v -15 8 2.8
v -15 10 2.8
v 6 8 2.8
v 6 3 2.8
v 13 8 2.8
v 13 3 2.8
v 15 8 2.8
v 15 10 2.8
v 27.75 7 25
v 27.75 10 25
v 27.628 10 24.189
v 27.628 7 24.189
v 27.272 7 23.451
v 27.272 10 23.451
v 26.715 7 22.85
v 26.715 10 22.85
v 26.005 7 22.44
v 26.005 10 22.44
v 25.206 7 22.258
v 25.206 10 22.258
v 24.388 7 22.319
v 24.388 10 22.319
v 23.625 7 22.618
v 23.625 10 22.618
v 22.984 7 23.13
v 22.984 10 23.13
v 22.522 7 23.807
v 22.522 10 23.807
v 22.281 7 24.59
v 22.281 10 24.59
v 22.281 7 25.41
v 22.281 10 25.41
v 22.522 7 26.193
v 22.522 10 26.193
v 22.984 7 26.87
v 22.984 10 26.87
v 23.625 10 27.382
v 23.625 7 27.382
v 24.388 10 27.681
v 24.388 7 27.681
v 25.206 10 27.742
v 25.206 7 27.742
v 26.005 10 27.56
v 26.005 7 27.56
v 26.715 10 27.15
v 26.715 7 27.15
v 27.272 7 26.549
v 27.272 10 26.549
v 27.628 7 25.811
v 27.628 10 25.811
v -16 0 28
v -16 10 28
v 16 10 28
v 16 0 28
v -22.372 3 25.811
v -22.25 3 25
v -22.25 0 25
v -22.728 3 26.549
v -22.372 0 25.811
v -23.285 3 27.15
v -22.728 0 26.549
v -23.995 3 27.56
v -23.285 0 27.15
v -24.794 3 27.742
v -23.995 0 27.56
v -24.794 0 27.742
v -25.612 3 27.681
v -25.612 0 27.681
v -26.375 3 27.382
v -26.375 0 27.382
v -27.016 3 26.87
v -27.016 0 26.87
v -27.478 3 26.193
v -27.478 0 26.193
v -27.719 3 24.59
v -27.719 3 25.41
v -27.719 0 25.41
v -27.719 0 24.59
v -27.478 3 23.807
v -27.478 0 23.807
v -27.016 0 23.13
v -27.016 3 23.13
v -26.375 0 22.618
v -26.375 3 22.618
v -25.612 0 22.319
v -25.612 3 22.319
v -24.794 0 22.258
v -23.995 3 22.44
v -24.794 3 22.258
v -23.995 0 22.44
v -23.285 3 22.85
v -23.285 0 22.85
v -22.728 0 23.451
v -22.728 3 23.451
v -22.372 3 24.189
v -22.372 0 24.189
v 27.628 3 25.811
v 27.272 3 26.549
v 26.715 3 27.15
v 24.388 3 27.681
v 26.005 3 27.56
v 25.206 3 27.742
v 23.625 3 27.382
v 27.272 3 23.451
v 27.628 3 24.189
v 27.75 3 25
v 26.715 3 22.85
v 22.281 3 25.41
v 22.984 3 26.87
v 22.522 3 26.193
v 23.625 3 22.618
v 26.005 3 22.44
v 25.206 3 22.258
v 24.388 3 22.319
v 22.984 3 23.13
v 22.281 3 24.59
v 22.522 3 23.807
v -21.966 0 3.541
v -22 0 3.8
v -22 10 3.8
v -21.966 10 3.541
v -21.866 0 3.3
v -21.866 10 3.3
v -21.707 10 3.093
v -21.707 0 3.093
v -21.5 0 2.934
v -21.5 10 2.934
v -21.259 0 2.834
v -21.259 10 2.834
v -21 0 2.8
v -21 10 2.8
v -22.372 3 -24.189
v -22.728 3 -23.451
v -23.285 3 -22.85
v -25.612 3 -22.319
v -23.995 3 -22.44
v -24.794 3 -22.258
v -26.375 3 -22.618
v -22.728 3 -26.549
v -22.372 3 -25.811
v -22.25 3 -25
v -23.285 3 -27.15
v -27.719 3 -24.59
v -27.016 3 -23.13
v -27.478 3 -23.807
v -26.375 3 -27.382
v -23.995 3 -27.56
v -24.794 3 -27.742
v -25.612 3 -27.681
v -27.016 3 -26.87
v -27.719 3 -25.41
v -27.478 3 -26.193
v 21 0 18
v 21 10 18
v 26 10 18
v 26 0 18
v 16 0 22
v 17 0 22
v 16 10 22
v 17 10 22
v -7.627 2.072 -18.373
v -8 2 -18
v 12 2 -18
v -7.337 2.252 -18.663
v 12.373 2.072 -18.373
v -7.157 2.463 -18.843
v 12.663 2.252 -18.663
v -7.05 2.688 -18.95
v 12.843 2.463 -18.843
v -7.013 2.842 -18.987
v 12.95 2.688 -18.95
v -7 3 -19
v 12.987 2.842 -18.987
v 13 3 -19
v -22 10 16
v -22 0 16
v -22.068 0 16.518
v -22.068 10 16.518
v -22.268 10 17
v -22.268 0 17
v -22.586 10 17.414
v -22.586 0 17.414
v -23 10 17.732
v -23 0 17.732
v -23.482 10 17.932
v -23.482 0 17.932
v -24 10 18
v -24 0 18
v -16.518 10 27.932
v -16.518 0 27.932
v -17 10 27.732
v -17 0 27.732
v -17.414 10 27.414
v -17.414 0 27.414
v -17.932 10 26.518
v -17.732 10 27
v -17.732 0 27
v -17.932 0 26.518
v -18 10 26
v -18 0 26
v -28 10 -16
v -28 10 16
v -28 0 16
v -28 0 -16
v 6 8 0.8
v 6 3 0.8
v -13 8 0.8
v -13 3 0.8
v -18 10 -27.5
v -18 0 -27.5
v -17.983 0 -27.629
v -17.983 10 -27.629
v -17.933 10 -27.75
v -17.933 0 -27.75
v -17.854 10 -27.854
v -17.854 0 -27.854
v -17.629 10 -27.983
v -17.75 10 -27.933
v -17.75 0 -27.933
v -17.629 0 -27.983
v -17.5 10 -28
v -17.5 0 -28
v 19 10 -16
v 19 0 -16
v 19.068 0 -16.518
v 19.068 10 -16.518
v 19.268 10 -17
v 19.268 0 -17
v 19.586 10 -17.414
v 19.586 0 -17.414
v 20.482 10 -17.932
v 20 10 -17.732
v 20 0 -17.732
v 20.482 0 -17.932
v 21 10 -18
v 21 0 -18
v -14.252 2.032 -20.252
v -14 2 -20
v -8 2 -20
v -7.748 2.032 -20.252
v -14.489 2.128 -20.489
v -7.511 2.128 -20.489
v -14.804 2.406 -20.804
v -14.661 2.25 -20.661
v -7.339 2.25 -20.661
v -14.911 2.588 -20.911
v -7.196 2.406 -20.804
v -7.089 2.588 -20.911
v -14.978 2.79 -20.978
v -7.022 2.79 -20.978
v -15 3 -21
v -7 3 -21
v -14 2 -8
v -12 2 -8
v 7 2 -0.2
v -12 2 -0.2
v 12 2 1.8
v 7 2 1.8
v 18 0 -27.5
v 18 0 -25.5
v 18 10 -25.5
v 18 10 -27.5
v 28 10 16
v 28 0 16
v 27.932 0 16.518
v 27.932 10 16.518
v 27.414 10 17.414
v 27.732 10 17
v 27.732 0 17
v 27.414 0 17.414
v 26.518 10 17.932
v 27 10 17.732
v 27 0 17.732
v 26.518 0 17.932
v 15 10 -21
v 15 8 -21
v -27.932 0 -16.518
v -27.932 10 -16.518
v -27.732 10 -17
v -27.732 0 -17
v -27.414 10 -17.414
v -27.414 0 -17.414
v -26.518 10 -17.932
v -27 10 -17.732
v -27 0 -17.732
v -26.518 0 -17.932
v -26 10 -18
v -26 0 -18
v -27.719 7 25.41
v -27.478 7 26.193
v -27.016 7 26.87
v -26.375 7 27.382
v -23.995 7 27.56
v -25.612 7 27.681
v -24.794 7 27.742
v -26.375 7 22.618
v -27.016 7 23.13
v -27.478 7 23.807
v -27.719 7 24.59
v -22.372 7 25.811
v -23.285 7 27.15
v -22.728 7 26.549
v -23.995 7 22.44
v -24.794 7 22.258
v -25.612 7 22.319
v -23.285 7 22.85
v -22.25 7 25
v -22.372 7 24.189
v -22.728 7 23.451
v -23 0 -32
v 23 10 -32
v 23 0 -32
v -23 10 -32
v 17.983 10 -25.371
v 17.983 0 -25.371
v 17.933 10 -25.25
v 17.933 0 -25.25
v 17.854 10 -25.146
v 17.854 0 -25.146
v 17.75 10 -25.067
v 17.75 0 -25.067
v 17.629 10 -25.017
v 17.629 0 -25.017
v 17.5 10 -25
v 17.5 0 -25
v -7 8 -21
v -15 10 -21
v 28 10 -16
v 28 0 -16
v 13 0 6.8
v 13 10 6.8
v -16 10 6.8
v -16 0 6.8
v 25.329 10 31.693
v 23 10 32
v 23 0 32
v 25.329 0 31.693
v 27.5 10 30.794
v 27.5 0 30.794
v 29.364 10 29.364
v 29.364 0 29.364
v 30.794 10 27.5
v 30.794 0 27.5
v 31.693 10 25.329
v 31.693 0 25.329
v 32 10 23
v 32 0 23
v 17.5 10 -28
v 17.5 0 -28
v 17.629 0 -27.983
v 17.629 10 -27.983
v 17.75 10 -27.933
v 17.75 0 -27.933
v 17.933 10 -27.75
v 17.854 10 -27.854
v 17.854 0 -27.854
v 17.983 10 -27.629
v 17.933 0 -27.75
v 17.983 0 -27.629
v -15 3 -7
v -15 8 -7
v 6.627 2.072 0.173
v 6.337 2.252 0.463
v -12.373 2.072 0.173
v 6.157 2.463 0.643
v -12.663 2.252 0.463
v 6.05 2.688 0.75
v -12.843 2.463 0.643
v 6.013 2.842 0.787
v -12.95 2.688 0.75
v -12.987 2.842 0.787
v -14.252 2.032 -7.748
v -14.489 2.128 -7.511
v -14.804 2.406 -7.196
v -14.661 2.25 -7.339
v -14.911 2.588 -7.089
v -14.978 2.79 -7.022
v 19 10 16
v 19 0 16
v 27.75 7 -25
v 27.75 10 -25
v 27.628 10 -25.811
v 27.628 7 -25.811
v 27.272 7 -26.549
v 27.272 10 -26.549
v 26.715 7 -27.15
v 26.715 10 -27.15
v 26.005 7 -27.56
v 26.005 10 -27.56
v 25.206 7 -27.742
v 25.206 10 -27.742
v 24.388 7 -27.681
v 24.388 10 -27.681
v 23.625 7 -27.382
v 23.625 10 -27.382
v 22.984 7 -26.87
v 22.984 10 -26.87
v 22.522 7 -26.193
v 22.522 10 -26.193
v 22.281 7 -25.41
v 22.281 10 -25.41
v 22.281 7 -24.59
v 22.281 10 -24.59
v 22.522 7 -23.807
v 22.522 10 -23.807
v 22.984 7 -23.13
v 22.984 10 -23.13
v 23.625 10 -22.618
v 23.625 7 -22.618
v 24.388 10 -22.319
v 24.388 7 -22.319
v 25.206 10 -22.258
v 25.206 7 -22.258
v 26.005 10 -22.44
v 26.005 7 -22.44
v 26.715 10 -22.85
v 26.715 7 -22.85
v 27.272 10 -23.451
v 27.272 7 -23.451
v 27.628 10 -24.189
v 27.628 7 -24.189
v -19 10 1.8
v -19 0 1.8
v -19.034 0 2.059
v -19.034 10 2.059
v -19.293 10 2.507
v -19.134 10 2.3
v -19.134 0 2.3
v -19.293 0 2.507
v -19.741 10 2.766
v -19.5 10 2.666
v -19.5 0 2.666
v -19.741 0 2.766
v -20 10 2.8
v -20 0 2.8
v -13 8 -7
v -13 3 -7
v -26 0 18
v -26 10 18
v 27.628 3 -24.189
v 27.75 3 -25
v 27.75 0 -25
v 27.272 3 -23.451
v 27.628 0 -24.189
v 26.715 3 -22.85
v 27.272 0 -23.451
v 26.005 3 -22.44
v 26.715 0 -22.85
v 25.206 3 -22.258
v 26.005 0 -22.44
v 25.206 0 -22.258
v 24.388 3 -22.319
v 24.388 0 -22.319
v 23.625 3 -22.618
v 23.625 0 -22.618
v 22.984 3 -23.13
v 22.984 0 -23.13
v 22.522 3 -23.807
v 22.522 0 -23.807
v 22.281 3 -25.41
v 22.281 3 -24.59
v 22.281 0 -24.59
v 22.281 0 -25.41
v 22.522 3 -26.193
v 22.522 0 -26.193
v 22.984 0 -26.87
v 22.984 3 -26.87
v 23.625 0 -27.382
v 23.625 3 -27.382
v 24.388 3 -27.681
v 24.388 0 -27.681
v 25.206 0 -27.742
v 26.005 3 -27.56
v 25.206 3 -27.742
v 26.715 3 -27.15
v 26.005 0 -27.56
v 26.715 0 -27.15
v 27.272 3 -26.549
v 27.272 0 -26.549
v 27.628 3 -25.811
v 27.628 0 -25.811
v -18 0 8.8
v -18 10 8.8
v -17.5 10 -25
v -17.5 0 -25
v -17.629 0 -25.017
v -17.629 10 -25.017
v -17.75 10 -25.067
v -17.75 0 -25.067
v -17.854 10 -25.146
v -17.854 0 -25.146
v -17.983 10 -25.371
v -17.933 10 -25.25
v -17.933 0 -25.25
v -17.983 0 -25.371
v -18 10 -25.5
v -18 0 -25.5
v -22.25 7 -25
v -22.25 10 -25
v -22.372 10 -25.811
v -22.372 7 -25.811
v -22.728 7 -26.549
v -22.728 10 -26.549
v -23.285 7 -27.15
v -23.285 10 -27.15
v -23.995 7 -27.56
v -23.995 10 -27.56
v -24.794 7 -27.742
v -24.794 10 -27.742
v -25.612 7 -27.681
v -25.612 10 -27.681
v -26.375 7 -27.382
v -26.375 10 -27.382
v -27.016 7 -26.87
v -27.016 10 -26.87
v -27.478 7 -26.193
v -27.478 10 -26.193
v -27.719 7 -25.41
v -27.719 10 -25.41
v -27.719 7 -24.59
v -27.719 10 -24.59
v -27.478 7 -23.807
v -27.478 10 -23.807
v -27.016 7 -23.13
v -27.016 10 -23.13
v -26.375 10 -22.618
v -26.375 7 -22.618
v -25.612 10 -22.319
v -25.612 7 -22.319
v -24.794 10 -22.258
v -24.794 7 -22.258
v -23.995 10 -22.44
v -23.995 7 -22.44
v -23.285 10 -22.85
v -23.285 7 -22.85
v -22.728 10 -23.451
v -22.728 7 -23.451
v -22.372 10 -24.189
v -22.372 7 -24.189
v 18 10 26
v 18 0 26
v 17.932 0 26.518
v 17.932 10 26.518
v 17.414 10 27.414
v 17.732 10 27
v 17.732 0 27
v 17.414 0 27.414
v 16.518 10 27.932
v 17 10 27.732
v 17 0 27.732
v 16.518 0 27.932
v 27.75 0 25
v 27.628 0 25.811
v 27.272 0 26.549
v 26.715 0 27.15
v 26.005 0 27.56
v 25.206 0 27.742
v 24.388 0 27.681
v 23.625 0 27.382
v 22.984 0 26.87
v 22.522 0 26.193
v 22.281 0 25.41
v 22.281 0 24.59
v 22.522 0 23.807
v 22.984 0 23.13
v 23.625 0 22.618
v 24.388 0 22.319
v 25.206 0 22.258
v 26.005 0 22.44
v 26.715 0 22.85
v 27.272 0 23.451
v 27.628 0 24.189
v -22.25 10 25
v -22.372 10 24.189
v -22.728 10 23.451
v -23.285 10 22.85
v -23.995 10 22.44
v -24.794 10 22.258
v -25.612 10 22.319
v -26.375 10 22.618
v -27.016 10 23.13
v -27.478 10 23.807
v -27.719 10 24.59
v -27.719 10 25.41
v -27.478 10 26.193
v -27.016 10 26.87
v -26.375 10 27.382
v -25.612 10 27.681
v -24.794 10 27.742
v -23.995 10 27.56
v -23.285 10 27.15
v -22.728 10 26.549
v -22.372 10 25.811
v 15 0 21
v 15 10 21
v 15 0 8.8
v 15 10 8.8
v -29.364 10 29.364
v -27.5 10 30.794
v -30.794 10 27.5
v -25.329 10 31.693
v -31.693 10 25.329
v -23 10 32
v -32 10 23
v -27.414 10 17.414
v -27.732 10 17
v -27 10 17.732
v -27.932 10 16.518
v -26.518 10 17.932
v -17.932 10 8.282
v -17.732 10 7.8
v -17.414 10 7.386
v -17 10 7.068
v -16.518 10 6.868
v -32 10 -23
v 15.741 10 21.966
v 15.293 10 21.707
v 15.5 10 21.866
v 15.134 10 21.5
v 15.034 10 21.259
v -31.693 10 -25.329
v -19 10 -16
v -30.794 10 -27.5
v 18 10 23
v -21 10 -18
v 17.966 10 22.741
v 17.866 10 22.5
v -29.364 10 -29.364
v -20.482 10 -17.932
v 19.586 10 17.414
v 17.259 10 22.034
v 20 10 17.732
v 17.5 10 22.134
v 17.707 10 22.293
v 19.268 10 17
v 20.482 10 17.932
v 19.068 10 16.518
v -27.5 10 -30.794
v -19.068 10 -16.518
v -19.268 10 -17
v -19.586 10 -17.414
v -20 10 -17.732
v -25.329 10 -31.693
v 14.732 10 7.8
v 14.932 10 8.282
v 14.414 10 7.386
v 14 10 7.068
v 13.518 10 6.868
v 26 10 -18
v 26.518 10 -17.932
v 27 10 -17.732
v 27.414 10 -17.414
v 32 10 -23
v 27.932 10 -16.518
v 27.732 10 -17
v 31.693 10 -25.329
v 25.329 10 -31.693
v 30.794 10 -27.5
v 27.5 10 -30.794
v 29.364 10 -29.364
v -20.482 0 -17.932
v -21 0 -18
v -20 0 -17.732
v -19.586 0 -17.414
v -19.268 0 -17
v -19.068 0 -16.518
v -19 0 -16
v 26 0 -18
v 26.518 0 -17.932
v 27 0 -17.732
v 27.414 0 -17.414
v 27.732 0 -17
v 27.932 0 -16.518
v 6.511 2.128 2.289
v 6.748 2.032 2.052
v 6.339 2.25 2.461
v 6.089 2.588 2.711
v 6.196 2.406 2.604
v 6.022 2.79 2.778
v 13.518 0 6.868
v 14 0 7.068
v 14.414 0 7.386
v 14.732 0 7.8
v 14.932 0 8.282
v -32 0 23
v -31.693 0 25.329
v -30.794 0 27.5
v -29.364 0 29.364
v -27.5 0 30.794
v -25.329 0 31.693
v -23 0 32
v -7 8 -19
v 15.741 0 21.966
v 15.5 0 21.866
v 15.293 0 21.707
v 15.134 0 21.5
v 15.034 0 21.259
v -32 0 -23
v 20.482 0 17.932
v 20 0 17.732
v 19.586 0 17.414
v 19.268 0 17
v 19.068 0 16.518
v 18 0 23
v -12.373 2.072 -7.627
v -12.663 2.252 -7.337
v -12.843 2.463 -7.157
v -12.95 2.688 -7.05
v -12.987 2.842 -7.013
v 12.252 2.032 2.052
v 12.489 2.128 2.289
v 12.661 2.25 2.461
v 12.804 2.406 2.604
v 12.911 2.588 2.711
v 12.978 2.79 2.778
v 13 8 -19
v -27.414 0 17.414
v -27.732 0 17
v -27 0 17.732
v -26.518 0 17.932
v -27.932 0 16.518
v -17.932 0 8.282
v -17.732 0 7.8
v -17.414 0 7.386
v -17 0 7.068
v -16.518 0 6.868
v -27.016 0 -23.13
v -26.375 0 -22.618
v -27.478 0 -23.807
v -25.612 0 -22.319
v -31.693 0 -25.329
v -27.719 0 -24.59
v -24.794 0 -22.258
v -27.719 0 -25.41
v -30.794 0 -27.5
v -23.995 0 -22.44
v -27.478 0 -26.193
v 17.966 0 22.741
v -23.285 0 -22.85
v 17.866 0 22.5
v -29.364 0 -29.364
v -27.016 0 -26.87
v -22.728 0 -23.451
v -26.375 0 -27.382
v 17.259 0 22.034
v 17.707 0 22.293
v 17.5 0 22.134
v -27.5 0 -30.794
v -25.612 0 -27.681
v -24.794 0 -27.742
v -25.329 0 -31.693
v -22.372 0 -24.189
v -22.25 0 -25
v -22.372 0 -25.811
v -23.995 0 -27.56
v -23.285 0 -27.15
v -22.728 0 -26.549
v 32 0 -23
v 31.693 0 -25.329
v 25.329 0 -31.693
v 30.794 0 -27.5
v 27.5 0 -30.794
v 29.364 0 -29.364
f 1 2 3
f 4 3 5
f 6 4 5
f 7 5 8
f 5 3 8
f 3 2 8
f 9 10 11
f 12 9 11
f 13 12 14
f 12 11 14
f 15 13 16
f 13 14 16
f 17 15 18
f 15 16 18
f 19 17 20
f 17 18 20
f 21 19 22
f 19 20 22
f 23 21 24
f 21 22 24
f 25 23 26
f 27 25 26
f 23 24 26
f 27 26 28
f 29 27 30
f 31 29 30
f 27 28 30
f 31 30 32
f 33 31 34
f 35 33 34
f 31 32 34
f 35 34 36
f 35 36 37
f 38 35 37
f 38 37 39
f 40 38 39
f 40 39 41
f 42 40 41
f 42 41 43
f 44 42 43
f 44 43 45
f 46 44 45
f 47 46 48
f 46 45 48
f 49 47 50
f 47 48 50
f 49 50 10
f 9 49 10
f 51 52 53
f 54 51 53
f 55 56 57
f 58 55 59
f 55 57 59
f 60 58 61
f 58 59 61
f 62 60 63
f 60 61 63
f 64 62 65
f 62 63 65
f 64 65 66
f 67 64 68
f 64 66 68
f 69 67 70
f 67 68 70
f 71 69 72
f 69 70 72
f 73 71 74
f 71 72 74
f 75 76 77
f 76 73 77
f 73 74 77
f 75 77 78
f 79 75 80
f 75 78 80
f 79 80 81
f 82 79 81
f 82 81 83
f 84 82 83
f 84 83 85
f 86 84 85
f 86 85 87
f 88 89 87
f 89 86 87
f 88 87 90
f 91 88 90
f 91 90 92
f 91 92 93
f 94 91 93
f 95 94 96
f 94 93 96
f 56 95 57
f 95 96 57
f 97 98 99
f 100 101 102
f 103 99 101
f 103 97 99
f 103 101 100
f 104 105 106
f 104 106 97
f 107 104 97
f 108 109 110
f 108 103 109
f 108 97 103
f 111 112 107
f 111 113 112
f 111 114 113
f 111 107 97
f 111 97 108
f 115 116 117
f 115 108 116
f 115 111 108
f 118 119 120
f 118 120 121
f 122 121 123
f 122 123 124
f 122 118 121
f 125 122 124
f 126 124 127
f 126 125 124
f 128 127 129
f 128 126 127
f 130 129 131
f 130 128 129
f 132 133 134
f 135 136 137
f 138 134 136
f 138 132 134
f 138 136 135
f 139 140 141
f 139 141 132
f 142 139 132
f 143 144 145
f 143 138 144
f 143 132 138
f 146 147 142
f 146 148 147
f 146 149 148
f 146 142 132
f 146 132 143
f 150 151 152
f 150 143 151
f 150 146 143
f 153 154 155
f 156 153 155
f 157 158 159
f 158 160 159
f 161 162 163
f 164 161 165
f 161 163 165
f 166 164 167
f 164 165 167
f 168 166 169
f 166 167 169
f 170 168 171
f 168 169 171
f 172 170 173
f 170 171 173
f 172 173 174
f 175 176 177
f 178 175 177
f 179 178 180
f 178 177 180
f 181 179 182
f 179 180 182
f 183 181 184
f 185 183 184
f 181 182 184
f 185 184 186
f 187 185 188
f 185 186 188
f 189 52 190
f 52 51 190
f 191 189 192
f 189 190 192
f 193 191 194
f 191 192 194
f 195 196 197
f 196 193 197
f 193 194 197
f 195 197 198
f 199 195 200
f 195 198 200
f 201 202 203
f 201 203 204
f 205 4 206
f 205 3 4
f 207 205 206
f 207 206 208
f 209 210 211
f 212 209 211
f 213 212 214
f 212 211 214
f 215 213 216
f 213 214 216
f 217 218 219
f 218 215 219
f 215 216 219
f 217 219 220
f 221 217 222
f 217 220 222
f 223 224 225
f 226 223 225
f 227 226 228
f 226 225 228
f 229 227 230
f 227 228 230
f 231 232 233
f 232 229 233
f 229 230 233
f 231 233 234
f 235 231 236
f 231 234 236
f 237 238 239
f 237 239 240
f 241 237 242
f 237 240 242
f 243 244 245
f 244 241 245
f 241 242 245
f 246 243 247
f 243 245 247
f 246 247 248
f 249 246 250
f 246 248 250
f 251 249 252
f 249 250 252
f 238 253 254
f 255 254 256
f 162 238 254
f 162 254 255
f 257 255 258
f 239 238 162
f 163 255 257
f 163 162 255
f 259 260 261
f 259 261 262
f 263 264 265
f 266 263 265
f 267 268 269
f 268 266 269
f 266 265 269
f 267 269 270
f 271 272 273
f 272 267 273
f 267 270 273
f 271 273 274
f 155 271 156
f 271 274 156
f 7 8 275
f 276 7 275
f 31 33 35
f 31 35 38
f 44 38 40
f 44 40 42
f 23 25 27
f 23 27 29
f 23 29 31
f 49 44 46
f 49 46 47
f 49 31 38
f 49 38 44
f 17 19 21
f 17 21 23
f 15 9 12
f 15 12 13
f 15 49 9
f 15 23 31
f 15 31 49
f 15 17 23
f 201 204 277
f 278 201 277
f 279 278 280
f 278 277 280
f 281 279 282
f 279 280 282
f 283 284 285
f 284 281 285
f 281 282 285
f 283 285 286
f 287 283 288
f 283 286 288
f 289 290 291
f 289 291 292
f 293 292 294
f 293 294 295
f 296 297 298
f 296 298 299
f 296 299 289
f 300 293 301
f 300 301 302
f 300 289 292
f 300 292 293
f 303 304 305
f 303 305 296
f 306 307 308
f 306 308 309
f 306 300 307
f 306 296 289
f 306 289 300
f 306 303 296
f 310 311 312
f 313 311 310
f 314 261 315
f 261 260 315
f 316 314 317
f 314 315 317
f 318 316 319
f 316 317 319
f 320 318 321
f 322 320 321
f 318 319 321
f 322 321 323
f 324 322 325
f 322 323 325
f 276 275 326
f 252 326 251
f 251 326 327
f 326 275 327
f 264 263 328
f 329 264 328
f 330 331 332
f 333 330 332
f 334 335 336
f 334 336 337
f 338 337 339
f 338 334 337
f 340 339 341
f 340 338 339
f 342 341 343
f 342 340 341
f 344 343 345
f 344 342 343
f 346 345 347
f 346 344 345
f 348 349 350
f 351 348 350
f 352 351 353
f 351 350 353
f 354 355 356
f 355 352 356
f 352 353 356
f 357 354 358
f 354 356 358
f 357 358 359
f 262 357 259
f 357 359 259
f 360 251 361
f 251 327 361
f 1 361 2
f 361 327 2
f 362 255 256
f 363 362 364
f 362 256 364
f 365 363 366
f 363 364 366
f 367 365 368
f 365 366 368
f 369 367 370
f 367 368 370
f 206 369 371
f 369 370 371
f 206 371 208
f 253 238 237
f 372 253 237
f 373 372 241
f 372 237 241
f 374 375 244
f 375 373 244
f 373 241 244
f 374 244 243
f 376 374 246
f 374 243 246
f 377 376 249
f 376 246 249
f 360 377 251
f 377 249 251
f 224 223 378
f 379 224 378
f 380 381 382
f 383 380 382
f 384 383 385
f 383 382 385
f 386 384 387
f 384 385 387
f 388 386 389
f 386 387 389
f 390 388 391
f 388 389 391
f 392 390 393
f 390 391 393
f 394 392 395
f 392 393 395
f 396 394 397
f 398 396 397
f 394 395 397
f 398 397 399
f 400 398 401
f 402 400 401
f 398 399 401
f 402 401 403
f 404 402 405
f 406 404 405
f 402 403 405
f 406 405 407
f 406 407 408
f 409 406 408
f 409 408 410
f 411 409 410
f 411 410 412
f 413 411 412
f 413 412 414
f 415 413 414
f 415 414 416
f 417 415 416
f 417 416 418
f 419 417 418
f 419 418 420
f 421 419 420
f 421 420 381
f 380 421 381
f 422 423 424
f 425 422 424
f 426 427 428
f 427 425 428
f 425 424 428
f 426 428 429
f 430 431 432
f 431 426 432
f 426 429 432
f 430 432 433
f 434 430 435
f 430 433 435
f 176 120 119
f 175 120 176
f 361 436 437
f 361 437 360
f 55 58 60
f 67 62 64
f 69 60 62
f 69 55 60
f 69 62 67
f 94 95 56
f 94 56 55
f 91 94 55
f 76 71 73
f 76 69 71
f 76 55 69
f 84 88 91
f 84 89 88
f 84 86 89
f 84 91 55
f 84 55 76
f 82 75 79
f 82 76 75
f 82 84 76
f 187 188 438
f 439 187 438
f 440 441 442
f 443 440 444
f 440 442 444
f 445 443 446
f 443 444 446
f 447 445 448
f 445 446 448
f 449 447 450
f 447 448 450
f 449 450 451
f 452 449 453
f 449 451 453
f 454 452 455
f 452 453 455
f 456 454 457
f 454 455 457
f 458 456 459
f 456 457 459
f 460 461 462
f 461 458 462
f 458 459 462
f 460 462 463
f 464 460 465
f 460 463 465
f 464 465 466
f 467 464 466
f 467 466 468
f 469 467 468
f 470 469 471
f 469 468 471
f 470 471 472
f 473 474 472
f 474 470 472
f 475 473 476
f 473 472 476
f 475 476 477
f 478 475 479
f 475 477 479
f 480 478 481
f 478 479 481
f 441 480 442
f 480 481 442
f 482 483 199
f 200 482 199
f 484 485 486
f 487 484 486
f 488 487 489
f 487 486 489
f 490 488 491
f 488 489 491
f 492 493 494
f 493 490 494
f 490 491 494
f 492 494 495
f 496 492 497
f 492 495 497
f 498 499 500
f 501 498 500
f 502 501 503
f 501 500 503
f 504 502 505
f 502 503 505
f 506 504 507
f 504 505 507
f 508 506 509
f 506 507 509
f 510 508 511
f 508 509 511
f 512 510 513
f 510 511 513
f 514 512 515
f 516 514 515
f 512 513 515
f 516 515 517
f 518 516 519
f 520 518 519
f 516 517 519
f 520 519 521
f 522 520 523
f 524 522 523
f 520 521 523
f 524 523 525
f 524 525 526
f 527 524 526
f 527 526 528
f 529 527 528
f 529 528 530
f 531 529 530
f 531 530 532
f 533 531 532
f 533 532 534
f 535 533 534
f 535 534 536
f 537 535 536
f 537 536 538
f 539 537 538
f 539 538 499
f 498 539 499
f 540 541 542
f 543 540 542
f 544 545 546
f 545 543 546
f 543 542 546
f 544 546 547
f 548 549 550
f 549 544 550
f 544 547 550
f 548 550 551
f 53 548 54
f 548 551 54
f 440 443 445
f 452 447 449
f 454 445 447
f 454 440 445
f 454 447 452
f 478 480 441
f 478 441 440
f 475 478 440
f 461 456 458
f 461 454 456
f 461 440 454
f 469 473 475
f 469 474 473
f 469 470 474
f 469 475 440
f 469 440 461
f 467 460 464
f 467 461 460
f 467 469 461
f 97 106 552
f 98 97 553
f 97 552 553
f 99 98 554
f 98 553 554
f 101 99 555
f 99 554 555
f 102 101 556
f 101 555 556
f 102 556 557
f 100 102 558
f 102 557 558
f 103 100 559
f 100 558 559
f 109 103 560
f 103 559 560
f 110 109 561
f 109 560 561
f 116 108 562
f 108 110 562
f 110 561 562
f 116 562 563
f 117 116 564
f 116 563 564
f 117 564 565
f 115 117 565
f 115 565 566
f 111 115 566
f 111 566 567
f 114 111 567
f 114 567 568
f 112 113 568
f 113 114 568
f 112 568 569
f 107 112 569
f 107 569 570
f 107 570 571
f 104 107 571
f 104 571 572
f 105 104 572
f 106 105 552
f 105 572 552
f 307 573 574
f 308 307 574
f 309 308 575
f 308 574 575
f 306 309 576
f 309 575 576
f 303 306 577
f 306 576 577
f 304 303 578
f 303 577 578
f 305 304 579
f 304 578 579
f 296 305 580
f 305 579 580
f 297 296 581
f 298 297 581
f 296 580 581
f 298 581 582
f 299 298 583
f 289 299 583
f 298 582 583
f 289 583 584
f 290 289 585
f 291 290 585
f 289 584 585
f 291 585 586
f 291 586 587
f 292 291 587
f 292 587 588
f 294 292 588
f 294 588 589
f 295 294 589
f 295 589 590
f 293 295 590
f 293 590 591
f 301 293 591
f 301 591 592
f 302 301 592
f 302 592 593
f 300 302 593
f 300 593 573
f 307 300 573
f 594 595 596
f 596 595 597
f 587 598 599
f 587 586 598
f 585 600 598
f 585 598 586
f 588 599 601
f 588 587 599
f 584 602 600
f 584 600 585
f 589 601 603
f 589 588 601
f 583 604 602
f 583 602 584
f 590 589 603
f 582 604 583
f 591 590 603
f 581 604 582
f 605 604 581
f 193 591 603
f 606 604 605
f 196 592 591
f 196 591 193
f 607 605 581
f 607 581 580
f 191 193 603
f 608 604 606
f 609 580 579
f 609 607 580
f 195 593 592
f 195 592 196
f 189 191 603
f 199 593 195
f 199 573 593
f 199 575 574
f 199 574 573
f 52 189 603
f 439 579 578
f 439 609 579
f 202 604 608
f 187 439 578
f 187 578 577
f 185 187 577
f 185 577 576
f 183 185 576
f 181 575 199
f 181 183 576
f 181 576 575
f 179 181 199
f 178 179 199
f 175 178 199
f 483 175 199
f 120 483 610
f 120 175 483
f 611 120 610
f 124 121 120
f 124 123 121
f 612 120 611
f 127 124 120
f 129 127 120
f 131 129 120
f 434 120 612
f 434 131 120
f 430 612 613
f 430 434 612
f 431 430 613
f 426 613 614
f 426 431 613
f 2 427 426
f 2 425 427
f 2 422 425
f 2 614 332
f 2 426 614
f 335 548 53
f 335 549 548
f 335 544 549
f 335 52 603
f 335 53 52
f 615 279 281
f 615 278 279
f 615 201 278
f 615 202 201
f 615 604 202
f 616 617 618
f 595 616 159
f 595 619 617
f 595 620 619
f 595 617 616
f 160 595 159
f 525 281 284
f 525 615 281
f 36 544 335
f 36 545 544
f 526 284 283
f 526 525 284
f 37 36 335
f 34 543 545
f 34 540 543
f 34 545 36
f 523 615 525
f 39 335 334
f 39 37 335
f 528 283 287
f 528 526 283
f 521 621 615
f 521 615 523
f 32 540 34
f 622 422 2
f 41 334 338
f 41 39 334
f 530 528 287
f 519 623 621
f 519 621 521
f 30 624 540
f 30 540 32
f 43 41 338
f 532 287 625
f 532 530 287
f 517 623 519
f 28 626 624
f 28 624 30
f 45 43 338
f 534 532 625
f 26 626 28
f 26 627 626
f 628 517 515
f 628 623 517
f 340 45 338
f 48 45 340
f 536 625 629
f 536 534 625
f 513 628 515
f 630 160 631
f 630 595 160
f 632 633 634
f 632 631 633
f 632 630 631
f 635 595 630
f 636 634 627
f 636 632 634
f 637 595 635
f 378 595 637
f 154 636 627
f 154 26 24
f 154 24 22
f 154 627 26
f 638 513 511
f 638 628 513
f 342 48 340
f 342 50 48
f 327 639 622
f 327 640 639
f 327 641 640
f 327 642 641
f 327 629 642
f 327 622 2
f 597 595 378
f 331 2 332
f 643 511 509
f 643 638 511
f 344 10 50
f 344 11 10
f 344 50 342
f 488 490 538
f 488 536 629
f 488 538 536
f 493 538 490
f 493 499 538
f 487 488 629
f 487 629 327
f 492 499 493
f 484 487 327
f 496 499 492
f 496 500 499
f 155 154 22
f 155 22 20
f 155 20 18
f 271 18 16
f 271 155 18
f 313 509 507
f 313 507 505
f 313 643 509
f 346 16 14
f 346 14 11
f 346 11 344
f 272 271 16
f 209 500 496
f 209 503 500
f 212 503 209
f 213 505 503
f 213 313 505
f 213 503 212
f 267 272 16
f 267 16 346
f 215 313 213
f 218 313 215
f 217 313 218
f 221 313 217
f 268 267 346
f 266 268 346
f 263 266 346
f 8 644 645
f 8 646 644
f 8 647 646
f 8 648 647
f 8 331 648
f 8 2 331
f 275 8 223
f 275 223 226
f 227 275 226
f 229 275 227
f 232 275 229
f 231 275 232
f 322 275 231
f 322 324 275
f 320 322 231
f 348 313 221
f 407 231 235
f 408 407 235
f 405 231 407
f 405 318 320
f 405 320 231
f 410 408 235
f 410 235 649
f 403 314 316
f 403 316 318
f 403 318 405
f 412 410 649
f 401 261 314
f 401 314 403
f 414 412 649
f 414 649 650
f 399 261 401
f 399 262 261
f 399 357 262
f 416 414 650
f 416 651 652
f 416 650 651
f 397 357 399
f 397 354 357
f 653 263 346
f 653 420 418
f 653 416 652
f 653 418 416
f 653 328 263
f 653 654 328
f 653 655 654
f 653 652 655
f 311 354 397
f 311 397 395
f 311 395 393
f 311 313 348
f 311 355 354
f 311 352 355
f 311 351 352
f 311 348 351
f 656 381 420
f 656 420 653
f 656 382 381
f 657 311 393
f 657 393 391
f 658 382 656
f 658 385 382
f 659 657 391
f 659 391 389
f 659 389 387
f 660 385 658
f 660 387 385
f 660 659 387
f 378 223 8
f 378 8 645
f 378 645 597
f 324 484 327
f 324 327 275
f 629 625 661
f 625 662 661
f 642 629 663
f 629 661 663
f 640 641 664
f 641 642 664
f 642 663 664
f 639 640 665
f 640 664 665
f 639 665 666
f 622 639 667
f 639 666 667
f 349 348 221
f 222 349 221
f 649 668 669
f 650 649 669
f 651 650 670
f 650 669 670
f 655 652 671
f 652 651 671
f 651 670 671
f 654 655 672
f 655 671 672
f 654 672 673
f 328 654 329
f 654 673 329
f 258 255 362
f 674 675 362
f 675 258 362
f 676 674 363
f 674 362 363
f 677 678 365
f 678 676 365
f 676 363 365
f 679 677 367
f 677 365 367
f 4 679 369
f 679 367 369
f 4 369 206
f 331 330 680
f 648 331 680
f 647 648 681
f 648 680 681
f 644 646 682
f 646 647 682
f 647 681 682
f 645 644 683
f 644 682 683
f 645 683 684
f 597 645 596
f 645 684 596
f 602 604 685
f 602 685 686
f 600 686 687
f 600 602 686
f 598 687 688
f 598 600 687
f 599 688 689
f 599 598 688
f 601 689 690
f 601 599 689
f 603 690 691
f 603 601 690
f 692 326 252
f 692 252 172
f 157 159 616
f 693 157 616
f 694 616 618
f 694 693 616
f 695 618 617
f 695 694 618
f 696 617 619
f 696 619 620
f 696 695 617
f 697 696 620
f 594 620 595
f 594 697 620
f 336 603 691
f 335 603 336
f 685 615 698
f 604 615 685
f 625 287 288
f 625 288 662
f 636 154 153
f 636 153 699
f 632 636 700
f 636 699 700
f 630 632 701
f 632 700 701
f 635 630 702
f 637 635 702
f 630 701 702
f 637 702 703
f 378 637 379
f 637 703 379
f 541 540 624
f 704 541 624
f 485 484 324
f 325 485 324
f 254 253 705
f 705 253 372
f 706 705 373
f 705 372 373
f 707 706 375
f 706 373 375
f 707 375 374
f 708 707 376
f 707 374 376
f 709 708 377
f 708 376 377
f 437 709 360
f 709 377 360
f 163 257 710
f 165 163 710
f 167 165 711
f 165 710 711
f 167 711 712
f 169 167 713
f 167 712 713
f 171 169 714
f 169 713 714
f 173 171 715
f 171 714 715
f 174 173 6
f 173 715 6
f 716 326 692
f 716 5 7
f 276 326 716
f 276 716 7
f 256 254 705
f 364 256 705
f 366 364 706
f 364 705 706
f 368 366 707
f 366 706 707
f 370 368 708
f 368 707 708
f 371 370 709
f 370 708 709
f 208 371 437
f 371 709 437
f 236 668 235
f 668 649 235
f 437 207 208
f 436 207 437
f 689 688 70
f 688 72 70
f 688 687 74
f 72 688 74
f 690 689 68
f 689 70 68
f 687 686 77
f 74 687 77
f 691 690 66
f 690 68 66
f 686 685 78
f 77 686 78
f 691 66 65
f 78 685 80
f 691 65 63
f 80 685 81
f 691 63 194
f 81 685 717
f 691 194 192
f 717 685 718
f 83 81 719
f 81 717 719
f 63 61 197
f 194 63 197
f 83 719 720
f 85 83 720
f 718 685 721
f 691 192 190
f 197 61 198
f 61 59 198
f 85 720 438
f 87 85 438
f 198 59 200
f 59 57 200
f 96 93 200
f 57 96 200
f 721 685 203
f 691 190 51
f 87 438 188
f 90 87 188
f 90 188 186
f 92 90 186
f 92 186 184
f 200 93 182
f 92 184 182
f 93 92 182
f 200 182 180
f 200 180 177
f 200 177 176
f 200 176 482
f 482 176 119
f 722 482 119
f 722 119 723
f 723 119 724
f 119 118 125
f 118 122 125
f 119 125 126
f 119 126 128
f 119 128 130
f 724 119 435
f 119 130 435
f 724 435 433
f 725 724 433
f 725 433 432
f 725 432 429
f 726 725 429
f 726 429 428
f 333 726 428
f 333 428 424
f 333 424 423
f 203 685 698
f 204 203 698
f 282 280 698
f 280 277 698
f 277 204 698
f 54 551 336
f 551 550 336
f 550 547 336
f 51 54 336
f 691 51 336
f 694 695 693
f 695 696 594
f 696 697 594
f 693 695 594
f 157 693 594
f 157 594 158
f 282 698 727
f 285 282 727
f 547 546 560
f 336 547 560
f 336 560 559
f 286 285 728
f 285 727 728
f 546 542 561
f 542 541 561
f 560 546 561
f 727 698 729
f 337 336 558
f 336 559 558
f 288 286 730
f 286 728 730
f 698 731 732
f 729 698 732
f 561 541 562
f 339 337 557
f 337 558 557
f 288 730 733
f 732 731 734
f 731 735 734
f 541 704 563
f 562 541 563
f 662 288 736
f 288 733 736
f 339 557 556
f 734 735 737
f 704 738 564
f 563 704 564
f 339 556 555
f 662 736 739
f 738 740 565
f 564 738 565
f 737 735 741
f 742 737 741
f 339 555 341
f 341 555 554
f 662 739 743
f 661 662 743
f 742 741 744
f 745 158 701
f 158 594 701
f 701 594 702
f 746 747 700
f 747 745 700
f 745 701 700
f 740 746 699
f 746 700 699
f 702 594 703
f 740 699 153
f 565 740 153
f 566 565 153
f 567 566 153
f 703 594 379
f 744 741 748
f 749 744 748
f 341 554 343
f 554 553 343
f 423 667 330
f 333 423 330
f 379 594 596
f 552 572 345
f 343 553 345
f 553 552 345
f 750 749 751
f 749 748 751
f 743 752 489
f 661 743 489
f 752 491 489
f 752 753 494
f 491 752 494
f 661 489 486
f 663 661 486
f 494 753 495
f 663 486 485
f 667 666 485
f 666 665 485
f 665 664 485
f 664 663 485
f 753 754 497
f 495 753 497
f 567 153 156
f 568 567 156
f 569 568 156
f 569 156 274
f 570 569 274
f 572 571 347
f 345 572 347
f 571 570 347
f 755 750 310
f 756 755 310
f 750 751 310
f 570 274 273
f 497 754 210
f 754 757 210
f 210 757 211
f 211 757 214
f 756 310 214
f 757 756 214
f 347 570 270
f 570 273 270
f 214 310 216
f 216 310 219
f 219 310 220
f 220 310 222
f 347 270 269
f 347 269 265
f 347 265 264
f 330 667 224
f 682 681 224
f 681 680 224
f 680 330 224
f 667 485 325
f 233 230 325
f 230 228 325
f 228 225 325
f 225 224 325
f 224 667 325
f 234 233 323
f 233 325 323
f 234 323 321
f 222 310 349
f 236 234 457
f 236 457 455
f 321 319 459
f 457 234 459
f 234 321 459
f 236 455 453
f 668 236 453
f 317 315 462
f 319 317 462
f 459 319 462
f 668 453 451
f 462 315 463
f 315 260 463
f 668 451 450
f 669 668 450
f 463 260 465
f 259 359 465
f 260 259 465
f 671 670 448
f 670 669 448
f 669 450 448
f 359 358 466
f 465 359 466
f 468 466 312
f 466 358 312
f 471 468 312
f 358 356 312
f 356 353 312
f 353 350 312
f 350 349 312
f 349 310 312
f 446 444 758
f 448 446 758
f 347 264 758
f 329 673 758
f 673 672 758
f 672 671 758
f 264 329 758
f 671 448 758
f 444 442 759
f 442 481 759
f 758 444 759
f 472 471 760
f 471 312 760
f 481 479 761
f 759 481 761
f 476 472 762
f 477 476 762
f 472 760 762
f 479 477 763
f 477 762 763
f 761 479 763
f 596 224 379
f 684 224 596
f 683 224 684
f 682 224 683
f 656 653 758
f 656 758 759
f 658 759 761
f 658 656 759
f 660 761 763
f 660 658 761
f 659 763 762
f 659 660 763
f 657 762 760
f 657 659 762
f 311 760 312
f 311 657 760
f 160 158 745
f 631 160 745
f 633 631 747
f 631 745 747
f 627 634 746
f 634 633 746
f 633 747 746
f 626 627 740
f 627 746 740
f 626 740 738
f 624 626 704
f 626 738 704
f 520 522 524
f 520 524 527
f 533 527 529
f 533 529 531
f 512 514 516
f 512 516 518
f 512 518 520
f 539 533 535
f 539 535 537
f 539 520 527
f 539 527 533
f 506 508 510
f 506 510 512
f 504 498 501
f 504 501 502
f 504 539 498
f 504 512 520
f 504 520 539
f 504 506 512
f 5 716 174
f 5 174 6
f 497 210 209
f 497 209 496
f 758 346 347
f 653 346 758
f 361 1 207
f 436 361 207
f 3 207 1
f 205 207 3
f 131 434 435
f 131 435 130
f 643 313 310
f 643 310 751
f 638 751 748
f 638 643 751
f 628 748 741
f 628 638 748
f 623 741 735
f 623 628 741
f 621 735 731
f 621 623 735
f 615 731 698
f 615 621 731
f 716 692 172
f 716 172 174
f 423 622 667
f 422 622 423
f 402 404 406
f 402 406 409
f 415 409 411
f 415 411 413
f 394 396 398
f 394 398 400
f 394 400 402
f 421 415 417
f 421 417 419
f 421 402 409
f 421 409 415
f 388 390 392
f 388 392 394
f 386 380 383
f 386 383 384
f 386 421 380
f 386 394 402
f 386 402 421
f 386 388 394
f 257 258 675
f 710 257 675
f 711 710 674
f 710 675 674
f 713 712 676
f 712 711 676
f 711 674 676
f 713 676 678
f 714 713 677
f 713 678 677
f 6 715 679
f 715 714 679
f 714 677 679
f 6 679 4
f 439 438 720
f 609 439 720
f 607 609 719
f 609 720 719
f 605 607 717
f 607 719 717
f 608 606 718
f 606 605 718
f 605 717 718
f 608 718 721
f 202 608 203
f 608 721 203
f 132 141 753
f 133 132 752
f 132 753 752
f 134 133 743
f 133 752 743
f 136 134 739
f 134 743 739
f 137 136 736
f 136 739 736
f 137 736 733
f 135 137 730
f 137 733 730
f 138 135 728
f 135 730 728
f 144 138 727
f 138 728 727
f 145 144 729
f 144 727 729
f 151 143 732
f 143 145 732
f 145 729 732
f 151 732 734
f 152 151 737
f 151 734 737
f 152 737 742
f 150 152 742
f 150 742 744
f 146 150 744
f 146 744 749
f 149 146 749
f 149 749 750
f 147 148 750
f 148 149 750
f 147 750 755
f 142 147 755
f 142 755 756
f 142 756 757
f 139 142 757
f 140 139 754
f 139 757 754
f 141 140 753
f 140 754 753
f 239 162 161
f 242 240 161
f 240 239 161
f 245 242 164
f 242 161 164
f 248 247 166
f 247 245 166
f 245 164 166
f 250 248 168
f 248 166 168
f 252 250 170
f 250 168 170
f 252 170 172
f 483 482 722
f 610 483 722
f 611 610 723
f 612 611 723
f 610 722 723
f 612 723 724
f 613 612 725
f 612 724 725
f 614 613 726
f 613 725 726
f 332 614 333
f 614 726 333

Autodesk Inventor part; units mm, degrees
ref_plane "YZ Plane" through (0, 0, 0) normal (1, 0, 0) x (0, 1, 0)
ref_plane "XZ Plane" through (0, 0, 0) normal (0, 1, 0) x (-1, 0, 0)
sketch "Sketch1" plane through (0, 0, 0) normal (0, 1, 0) x (-1, 0, 0)
  line L0 (30, 30) -> (-30, 30)
  line L1 (-30, 30) -> (-30, -30)
  line L2 (-30, -30) -> (30, -30)
  line L3 (30, -30) -> (30, 30)
  line L4 (30, 30) -> (-30, -30) construction
  line L5 (-30, 30) -> (30, -30) construction
  point P0 (0, 0)
  dimension "d0" = 60
  dimension "d1" = 60
extrude "Extrusion1" add sketch "Sketch1" along normal blind 10
fillet "Fillet1" radius 7 4 edges at (30, 5, 30) (30, 5, -30) (-30, 5, 30) (-30, 5, -30)
sketch "Sketch2" plane through (0, 10, 0) normal (0, 1, 0) x (1, 0, 0)
  line L0 (-30, 30) -> (30, 30)
  line L1 (30, 30) -> (30, -30)
  line L2 (30, -30) -> (-30, -30)
  line L3 (-30, -30) -> (-30, 30)
  line L4 (-30, 30) -> (30, -30) construction
  line L5 (30, 30) -> (-30, -30) construction
  line L6 (25, -25) -> (25, 25)
  line L7 (25, 25) -> (-25, 25)
  line L8 (-25, 25) -> (-25, -25)
  line L9 (-25, -25) -> (25, -25)
  circle A0 centre (25, -25) radius 2.75
  circle A1 centre (-25, -25) radius 2.75
  circle A2 centre (25, 25) radius 2.75
  circle A3 centre (-25, 25) radius 2.75
  point P0 (0, 0)
  dimension "d5" = 5
  dimension "d6" = 5.5
  dimension "d7" = 5.5
  dimension "d8" = 5.5
  dimension "d9" = 5.5
extrude "Extrusion2" cut sketch "Sketch2" against normal blind 3 contours L9 A0 L6 | L6 A0 L9 | A2 L7 L6 | L6 L7 A2 | A1 L8 L9 | L9 L8 A1 | A3 L8 L7 | L7 L8 A3
sketch "Sketch7" plane through (0, 10, 0) normal (0, 1, 0) x (1, 0, 0)
  line L0 (-23, 30) -> (23, 30)
  line L1 (30, 23) -> (30, -23)
  line L2 (23, -30) -> (-23, -30)
  line L3 (-30, -23) -> (-30, 23)
  line L4 (-30, 30) -> (30, -30) construction
  line L5 (30, 30) -> (-30, -30) construction
  arc A0 (-23, 30) -> (-30, 23) centre (-23, 23) ccw
  arc A1 (-30, -23) -> (-23, -30) centre (-23, -23) ccw
  arc A2 (23, -30) -> (30, -23) centre (23, -23) ccw
  arc A3 (30, 23) -> (23, 30) centre (23, 23) ccw
  line L6 (23, 32) -> (-23, 32)
  arc A4 (-23, 32) -> (-32, 23) centre (-23, 23) ccw
  line L7 (-32, 23) -> (-32, -23)
  arc A5 (-32, -23) -> (-23, -32) centre (-23, -23) ccw
  line L8 (-23, -32) -> (23, -32)
  arc A6 (23, -32) -> (32, -23) centre (23, -23) ccw
  line L9 (32, -23) -> (32, 23)
  arc A7 (32, 23) -> (23, 32) centre (23, 23) ccw
  point P0 (0, 0)
  dimension "d47" = 7
  dimension "d48" = 2
extrude "Extrusion6" add sketch "Sketch7" against normal blind 10
sketch "Sketch33" plane through (0, 10, 0) normal (0, 1, 0) x (1, 0, 0)
  line L0 (-25, 25) -> (25, 25)
  line L1 (25, 25) -> (25, -25)
  line L2 (25, -25) -> (-25, -25)
  line L3 (-25, -25) -> (-25, 25)
  line L4 (-25, 25) -> (25, -25) construction
  line L5 (25, 25) -> (-25, -25) construction
  line L6 (21, 21) -> (-21, 21)
  line L7 (-21, 21) -> (-21, -21)
  line L8 (-21, -21) -> (21, -21)
  line L9 (21, -21) -> (21, 21)
  line L10 (-15, 21) -> (-15, -2.8)
  line L11 (-15, -2.8) -> (15, -2.8)
  line L12 (15, -2.8) -> (15, 21)
  line L13 (-13, 7) -> (-13, -0.8)
  line L14 (-13, -0.8) -> (6, -0.8)
  line L15 (13, -0.8) -> (13, 19)
  line L16 (-7, 21) -> (-7, 19)
  line L17 (-7, 19) -> (13, 19)
  line L18 (13, -0.8) -> (13, -2.8)
  line L19 (6, -2.8) -> (6, -0.8)
  line L20 (-15, 7) -> (-13, 7)
  point P0 (0, 0)
  point P1 (-21, 15)
  dimension "d349" = 50
  dimension "d350" = 50
  dimension "d351" = 4
  dimension "d352" = 6
  dimension "d353" = 30
  dimension "d354" = 6
  dimension "d355" = 23.8
  dimension "d356" = 8
  dimension "d357" = 2
  dimension "d358" = 7
  dimension "d359" = 2
  dimension "d360" = 2
  dimension "d361" = 14
extrude "Extrusion31" cut sketch "Sketch33" against normal blind 2 contours L12 L11 L18 L15 L17 L16 L6 | L20 L13 L14 L19 L11 L10
sketch "Sketch34" plane through (0, 10, 0) normal (0, 1, 0) x (1, 0, 0)
  line L0 (13, -2.8) -> (6, -2.8)
  line L1 (6, -2.8) -> (6, -0.8)
  line L2 (6, -0.8) -> (-13, -0.8)
  line L3 (-13, -0.8) -> (-13, 7)
  line L4 (-13, 7) -> (-15, 7)
  line L5 (-15, 7) -> (-15, 21)
  line L6 (-15, 21) -> (-7, 21)
  line L7 (-7, 21) -> (-7, 19)
  line L8 (-7, 19) -> (13, 19)
  line L9 (13, 19) -> (13, -2.8)
  line L10 (13, -2.8) -> (13, 19) projected
  point P0 (0, 0)
extrude "Extrusion32" cut sketch "Sketch34" against normal blind 8
sketch "Sketch35" plane through (0, 10, 0) normal (0, 1, 0) x (1, 0, 0)
  line L0 (23, 32) -> (-23, 32) projected
  line L1 (-32, 23) -> (-32, -23) projected
  line L2 (32, -23) -> (32, 23) projected
  line L3 (-15, 21) -> (15, 21) projected
  line L4 (18, 28) -> (-18, 28)
  line L5 (-18, 28) -> (-18, 25)
  line L6 (-18, 25) -> (18, 25)
  line L7 (18, 25) -> (18, 28)
  line L8 (-23, -32) -> (23, -32) projected
  line L9 (15, 21) -> (15, -2.8) projected
  line L10 (28, -18) -> (28, 18)
  line L11 (28, 18) -> (19, 18)
  line L12 (19, 18) -> (19, -18)
  line L13 (19, -18) -> (28, -18)
  line L14 (15, -2.8) -> (-15, -2.8) projected
  line L15 (-18, -28) -> (18, -28)
  line L16 (18, -28) -> (18, -22)
  line L17 (18, -22) -> (15, -22)
  line L18 (15, -22) -> (15, -6.8)
  line L19 (15, -6.8) -> (-18, -6.8)
  line L20 (-18, -6.8) -> (-18, -28)
  line L21 (-15, -2.8) -> (-15, 21) projected
  line L22 (-22, -18) -> (-28, -18)
  line L23 (-28, -18) -> (-28, 18)
  line L24 (-28, 18) -> (-19, 18)
  line L25 (-19, 18) -> (-19, -2.8)
  line L26 (-19, -2.8) -> (-22, -2.8)
  line L27 (-22, -2.8) -> (-22, -18)
  point P0 (0, 0)
  dimension "d366" = 4
  dimension "d367" = 4
  dimension "d368" = 14
  dimension "d369" = 14
  dimension "d370" = 4
  dimension "d371" = 4
  dimension "d372" = 14
  dimension "d373" = 4
  dimension "d374" = 14
  dimension "d375" = 4
  dimension "d376" = 4
  dimension "d377" = 14
  dimension "d378" = 4
  dimension "d379" = 4
  dimension "d380" = 4
  dimension "d381" = 14
  dimension "d382" = 4
  dimension "d383" = 14
  dimension "d384" = 14
  dimension "d385" = 4
  dimension "d386" = 4
  dimension "d387" = 4
extrude "Extrusion33" cut sketch "Sketch35" against normal through all contours L7 L6 L5 L4 | L13 L12 L11 L10 | L20 L19 L18 L17 L16 L15 | L22 L23 L24 L25 L26 L27
fillet "Fillet10" radius 2 12 edges at (19, 5, 18) (-28, 5, 18) (-18, 5, 28) (15, 5, 6.8) (28, 5, -18) (28, 5, 18) (18, 5, 28) (-18, 5, 6.8) (19, 5, -18) (-28, 5, -18) (-19, 5, -18) (-22, 5, 18)
fillet "Fillet10" radius 1 14 edges at (15, 5, 22) (9.5, 2, 2.8) (13, 2, -8.1) (-3.5, 2, 0.8) (-13, 2, -3.1) (-15, 2, -14) (-22, 5, 2.8) (-19, 5, 2.8) (18, 5, 22) (3, 2, -19) (-11, 2, -21) (-14, 2, -7) (6, 2, 1.8) (-7, 2, -20)
fillet "Fillet10" radius 0.5 4 edges at (-18, 5, -25) (-18, 5, -28) (18, 5, -25) (18, 5, -28)
ref_plane "Work Plane9" through (0, 5, 0) normal (0, 1, 0) x (1, 0, 0)
mirror "Mirror9" about plane through (0, 5, 0) normal (0, 1, 0) of "Extrusion2"
properties part number "8 pinshort"
